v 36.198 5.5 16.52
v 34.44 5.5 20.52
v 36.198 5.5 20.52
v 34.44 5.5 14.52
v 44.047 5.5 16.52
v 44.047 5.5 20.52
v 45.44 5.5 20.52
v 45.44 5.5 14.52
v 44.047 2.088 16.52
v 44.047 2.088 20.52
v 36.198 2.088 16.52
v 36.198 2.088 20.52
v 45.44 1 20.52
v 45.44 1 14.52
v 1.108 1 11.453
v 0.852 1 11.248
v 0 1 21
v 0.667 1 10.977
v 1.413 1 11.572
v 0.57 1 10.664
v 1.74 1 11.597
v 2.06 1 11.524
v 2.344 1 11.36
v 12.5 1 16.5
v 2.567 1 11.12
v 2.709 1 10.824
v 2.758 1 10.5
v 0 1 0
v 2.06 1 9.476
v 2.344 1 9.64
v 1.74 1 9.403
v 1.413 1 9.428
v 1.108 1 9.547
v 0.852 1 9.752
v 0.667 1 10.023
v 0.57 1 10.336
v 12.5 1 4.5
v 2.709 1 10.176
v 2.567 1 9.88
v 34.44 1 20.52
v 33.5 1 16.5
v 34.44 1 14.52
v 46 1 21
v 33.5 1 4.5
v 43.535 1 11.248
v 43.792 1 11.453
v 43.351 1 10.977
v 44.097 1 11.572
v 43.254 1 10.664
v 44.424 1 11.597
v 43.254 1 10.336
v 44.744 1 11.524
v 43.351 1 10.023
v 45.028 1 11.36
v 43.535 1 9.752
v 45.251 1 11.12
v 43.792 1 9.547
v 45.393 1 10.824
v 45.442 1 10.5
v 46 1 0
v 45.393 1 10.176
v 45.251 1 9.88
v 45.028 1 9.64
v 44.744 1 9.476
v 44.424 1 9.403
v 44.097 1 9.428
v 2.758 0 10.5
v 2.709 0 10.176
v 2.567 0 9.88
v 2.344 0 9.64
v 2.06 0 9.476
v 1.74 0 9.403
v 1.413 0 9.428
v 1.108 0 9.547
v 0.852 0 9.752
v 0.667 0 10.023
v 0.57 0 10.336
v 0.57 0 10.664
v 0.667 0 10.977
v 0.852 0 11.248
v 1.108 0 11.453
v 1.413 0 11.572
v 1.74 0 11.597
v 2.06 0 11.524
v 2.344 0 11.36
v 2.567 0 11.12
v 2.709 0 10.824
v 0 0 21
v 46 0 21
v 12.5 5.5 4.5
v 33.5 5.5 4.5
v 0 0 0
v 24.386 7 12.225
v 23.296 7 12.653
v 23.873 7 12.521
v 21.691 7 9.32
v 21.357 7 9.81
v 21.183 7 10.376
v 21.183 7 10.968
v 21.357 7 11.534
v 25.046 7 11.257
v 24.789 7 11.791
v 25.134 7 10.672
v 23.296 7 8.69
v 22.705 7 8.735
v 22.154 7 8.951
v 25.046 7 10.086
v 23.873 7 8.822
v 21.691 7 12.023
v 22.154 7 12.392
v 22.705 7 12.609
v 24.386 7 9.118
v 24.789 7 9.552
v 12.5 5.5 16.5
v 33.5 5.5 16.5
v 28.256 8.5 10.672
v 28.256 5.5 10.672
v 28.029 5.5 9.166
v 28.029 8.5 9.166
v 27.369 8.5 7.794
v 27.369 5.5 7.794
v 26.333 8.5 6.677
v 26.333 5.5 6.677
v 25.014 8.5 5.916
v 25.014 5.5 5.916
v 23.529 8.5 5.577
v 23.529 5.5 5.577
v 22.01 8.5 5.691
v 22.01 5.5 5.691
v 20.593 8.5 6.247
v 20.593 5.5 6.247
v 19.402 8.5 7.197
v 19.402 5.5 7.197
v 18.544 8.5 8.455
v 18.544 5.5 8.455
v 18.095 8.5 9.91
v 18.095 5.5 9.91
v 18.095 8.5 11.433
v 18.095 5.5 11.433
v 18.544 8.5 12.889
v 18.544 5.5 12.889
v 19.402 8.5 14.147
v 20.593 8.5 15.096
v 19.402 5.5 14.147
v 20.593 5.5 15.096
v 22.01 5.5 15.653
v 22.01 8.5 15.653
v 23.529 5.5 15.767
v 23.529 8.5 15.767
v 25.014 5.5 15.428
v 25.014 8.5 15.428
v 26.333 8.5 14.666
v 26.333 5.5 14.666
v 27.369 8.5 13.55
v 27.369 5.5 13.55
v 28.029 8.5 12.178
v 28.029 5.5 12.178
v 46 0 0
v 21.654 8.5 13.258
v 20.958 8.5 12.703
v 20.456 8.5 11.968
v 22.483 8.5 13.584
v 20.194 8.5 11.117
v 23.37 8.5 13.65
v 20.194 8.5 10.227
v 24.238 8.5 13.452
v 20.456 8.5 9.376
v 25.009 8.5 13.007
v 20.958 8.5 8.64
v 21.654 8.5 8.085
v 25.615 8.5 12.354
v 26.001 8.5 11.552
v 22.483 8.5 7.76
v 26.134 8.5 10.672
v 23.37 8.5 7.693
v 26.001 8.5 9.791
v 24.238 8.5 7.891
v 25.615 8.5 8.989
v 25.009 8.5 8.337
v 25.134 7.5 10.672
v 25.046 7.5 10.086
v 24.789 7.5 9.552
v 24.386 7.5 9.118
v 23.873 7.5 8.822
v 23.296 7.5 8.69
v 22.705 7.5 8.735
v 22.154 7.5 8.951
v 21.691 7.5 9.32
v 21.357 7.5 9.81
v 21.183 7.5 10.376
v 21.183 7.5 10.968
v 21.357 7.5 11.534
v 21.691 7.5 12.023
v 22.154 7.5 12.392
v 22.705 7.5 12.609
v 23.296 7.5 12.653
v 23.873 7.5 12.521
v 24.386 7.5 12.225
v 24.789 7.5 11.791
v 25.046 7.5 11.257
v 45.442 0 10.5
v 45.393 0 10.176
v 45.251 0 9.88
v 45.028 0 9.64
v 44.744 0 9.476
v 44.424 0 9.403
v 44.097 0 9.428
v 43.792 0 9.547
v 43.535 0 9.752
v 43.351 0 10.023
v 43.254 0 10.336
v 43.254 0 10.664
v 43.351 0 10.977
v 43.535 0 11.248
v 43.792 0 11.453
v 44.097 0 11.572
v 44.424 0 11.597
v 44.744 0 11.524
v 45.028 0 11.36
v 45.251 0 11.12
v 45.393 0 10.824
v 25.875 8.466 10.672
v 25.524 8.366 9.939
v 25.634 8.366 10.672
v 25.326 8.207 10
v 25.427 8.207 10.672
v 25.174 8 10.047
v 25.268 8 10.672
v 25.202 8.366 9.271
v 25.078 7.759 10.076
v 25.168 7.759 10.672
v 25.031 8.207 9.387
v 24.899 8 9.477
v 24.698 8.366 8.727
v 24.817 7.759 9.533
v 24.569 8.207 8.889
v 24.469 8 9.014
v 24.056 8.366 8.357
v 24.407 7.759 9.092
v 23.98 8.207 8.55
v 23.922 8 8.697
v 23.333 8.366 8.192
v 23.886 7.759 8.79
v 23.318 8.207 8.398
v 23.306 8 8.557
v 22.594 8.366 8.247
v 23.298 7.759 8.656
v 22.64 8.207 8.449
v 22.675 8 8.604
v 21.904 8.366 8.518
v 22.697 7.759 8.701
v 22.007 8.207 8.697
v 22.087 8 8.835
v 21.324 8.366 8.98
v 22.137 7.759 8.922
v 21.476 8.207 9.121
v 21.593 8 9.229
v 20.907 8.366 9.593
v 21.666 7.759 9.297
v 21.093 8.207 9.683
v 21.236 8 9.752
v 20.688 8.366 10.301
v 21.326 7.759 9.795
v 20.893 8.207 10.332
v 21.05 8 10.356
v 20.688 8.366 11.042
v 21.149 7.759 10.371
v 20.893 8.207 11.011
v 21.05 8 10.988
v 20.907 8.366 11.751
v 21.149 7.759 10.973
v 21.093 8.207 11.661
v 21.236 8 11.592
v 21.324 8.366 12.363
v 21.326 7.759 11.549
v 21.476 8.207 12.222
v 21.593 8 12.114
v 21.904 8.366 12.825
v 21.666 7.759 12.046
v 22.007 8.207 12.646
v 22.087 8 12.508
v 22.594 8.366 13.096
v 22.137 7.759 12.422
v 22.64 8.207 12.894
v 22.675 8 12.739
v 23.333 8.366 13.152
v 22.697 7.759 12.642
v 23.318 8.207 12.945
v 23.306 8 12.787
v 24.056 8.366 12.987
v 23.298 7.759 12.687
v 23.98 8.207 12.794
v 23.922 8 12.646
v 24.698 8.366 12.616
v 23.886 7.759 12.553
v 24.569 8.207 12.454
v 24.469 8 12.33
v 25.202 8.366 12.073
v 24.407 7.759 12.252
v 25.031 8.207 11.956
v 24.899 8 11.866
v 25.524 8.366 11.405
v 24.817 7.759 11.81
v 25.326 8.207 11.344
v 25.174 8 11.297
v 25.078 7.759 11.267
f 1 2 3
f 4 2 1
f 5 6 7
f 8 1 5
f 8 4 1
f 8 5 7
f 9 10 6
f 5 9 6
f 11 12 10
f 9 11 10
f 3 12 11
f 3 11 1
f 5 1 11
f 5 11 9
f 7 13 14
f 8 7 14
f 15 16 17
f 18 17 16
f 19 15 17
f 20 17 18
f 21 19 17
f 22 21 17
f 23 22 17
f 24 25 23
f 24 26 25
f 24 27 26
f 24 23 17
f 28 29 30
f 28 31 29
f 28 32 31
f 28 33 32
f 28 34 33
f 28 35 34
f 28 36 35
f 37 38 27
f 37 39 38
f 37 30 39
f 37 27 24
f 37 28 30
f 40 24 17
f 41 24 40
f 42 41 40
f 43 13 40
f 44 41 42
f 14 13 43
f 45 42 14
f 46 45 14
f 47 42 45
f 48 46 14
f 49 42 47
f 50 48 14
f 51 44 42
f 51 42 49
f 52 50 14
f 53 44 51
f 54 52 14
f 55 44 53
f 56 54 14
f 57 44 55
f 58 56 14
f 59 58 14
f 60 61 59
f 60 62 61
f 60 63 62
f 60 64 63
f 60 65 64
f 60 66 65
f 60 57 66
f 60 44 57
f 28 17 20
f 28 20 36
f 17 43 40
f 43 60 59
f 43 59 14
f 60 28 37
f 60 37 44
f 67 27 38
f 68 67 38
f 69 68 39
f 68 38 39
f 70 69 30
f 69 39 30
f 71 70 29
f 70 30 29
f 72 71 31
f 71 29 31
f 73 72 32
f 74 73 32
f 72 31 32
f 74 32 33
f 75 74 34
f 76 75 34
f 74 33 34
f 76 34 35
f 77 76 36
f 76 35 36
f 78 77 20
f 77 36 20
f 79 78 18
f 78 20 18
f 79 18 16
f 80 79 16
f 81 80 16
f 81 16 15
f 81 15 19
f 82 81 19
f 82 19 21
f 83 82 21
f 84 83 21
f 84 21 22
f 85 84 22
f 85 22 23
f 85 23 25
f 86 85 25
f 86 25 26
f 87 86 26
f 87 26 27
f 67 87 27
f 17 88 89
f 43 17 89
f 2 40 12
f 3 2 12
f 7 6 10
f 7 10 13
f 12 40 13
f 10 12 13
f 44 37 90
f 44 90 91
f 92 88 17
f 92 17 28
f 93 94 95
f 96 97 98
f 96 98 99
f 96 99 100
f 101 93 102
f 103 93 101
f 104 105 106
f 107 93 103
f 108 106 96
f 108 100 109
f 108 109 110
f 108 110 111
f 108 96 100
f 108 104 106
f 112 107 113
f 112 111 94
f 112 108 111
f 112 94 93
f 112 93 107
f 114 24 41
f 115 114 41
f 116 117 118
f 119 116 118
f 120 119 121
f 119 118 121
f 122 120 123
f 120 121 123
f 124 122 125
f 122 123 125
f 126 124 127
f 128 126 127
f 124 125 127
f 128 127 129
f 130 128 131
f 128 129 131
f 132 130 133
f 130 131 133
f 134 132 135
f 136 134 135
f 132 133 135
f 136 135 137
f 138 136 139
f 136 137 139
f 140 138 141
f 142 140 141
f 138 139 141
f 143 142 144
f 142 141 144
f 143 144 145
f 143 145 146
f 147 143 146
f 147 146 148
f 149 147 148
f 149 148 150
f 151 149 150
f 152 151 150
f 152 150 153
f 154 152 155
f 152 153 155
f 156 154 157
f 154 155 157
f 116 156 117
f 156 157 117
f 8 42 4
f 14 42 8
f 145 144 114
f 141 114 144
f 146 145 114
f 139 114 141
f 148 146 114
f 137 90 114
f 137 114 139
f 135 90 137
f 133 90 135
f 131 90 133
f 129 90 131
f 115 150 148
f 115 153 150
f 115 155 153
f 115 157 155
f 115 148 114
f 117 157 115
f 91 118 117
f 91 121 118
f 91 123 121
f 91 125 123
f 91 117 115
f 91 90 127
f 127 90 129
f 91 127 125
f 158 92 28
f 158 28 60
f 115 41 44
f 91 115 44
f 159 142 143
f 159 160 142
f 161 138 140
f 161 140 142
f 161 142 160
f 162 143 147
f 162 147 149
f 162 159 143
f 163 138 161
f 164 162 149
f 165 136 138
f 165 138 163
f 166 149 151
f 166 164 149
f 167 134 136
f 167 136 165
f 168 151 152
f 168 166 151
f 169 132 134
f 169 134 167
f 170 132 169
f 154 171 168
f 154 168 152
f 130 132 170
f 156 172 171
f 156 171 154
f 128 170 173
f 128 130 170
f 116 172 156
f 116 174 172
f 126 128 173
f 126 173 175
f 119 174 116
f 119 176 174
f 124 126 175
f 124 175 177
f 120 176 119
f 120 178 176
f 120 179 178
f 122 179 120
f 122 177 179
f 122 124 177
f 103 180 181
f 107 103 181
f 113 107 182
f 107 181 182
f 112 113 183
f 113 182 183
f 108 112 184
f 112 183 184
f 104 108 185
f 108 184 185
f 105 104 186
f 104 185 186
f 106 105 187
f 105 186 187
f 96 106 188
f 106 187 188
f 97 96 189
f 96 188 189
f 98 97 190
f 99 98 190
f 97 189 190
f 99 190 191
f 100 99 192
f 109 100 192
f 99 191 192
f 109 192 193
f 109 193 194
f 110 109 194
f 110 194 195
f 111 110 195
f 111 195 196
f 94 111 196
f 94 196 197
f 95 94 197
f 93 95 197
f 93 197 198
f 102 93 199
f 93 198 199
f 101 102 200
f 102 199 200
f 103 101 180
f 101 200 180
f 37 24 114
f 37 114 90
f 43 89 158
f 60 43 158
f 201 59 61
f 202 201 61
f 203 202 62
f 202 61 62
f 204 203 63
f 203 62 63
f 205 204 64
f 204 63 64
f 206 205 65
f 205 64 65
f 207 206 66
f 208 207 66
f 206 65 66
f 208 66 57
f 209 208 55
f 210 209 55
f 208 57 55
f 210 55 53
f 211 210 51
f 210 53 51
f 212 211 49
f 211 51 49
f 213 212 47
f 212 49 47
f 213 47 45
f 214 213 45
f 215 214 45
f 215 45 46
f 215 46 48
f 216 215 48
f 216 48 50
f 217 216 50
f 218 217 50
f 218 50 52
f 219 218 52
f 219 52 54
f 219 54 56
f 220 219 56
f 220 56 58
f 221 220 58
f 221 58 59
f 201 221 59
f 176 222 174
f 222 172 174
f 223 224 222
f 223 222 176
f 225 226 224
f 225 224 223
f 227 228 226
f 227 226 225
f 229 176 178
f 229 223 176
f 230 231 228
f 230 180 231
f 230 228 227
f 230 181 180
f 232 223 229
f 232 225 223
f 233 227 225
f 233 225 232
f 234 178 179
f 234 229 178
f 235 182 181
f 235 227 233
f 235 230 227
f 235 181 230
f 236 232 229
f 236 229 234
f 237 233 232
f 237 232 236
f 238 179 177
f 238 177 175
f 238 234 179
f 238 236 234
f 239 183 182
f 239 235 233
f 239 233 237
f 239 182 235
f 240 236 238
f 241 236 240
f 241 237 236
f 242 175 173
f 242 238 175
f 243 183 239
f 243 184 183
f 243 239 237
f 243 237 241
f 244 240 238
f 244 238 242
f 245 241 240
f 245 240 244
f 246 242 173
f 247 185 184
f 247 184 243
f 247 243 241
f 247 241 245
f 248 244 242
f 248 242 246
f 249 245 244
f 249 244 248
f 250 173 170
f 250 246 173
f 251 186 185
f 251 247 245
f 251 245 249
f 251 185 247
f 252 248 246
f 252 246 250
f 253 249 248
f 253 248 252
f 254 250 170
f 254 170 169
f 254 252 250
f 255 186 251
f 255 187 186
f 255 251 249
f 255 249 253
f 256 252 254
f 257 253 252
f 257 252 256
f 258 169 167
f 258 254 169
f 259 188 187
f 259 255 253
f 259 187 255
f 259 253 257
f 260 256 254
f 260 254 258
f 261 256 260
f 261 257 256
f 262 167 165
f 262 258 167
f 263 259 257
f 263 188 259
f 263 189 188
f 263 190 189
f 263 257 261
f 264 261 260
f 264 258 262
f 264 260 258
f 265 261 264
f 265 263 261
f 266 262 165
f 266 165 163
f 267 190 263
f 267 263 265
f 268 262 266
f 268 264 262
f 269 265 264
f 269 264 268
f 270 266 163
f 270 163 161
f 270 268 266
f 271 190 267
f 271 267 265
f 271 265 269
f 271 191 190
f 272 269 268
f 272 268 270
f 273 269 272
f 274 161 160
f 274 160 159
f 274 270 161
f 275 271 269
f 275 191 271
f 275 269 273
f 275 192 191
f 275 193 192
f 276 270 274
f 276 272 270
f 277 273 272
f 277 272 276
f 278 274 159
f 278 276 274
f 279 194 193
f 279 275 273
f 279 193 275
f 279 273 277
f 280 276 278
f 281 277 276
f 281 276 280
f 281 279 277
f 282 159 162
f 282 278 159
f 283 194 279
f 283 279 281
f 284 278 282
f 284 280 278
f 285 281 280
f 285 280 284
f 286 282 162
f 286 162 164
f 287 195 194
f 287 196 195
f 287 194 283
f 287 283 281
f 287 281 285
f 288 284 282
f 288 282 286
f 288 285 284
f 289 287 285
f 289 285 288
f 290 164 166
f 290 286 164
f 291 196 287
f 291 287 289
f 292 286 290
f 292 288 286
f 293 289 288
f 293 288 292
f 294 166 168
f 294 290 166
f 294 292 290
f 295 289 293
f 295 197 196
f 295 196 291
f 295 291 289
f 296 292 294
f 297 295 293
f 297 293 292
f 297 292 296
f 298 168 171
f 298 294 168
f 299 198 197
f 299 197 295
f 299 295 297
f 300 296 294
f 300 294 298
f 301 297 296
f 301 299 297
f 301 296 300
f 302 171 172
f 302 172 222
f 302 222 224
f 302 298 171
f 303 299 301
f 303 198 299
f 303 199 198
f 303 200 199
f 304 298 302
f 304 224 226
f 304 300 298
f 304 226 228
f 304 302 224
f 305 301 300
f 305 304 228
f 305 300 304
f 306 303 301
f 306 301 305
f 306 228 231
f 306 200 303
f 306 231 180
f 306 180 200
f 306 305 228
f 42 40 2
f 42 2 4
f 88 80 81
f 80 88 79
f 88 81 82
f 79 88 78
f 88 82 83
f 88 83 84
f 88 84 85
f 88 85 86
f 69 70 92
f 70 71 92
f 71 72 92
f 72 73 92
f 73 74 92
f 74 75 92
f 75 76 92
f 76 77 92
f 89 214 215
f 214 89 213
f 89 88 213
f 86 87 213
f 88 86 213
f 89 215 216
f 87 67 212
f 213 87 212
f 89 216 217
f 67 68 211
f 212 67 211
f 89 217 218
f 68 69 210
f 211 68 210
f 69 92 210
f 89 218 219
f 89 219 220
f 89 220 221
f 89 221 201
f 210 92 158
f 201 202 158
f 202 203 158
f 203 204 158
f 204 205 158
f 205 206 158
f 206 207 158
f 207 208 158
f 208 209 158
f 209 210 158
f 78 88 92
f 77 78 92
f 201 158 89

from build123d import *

# Parameters (mm, degrees)
SKETCH1_W           = 46
SKETCH1_H           = 21
BOSS_EXTRUDE1_DEPTH = 1
SKETCH2_W           = 21
SKETCH2_H           = 12
SKETCH2_W_2         = 11
SKETCH2_H_2         = 6
BOSS_EXTRUDE2_DEPTH = 4.5
SKETCH3_W           = 7.849871035
SKETCH3_H           = 3.412332869
CUT_EXTRUDE1_DEPTH  = 4
SKETCH4_R           = 5.109251927
BOSS_EXTRUDE3_DEPTH = 3
SKETCH5_R           = 1.986847175
CUT_EXTRUDE2_DEPTH  = 1.5
FILLET1_R           = 1
SKETCH6_R           = 1.1
CUT_EXTRUDE3_DEPTH  = 1.5


with BuildPart() as part:
    # Sketch1 → Boss-Extrude1 (new body)
    with BuildSketch(Plane(origin=(0, 0, 0), x_dir=(1, 0, 0), z_dir=(0, 1, 0))):
        with Locations((23, -10.5)):
            Rectangle(SKETCH1_W, SKETCH1_H)
    extrude(amount=BOSS_EXTRUDE1_DEPTH)

    # Sketch2 → Boss-Extrude2 (add)
    with BuildSketch(Plane(origin=(0, 1, 0), x_dir=(1, 0, 0), z_dir=(0, 1, 0))):
        with Locations((23, -10.5)):
            Rectangle(SKETCH2_W, SKETCH2_H)
        with Locations((39.939580859, -17.520481264)):
            Rectangle(SKETCH2_W_2, SKETCH2_H_2)
    extrude(amount=BOSS_EXTRUDE2_DEPTH)

    # Sketch3 → Cut-Extrude1 (cut)
    with BuildSketch(Plane.XY.offset(20.520481264)):
        with Locations((40.122531197, 3.793833565)):
            Rectangle(SKETCH3_W, SKETCH3_H)
    extrude(amount=-CUT_EXTRUDE1_DEPTH, mode=Mode.SUBTRACT)

    # Sketch4 → Boss-Extrude3 (add)
    with BuildSketch(Plane(origin=(0, 5.5, 0), x_dir=(1, 0, 0), z_dir=(0, 1, 0))):
        with Locations((23.147185082, -10.671715929)):
            Circle(SKETCH4_R)
    extrude(amount=BOSS_EXTRUDE3_DEPTH)

    # Sketch5 → Cut-Extrude2 (cut)
    with BuildSketch(Plane(origin=(0, 8.5, 0), x_dir=(1, 0, 0), z_dir=(0, 1, 0))):
        with Locations((23.147185082, -10.671715929)):
            Circle(SKETCH5_R)
    extrude(amount=-CUT_EXTRUDE2_DEPTH, mode=Mode.SUBTRACT)

    # Fillet1
    fillet1_edges = [part.edges().sort_by_distance(p)[0] for p in [
        (21.160337907, 8.5, 10.671715929),
    ]]
    fillet(fillet1_edges, radius=FILLET1_R)

    # Sketch6 → Cut-Extrude3 (cut)
    with BuildSketch(Plane(origin=(0, 1, 0), x_dir=(1, 0, 0), z_dir=(0, 1, 0))):
        with Locations((1.658163122, -10.5)):
            Circle(SKETCH6_R)
        with Locations((44.341836878, -10.5)):
            Circle(SKETCH6_R)
    extrude(amount=-CUT_EXTRUDE3_DEPTH, mode=Mode.SUBTRACT)


solid = part.part
